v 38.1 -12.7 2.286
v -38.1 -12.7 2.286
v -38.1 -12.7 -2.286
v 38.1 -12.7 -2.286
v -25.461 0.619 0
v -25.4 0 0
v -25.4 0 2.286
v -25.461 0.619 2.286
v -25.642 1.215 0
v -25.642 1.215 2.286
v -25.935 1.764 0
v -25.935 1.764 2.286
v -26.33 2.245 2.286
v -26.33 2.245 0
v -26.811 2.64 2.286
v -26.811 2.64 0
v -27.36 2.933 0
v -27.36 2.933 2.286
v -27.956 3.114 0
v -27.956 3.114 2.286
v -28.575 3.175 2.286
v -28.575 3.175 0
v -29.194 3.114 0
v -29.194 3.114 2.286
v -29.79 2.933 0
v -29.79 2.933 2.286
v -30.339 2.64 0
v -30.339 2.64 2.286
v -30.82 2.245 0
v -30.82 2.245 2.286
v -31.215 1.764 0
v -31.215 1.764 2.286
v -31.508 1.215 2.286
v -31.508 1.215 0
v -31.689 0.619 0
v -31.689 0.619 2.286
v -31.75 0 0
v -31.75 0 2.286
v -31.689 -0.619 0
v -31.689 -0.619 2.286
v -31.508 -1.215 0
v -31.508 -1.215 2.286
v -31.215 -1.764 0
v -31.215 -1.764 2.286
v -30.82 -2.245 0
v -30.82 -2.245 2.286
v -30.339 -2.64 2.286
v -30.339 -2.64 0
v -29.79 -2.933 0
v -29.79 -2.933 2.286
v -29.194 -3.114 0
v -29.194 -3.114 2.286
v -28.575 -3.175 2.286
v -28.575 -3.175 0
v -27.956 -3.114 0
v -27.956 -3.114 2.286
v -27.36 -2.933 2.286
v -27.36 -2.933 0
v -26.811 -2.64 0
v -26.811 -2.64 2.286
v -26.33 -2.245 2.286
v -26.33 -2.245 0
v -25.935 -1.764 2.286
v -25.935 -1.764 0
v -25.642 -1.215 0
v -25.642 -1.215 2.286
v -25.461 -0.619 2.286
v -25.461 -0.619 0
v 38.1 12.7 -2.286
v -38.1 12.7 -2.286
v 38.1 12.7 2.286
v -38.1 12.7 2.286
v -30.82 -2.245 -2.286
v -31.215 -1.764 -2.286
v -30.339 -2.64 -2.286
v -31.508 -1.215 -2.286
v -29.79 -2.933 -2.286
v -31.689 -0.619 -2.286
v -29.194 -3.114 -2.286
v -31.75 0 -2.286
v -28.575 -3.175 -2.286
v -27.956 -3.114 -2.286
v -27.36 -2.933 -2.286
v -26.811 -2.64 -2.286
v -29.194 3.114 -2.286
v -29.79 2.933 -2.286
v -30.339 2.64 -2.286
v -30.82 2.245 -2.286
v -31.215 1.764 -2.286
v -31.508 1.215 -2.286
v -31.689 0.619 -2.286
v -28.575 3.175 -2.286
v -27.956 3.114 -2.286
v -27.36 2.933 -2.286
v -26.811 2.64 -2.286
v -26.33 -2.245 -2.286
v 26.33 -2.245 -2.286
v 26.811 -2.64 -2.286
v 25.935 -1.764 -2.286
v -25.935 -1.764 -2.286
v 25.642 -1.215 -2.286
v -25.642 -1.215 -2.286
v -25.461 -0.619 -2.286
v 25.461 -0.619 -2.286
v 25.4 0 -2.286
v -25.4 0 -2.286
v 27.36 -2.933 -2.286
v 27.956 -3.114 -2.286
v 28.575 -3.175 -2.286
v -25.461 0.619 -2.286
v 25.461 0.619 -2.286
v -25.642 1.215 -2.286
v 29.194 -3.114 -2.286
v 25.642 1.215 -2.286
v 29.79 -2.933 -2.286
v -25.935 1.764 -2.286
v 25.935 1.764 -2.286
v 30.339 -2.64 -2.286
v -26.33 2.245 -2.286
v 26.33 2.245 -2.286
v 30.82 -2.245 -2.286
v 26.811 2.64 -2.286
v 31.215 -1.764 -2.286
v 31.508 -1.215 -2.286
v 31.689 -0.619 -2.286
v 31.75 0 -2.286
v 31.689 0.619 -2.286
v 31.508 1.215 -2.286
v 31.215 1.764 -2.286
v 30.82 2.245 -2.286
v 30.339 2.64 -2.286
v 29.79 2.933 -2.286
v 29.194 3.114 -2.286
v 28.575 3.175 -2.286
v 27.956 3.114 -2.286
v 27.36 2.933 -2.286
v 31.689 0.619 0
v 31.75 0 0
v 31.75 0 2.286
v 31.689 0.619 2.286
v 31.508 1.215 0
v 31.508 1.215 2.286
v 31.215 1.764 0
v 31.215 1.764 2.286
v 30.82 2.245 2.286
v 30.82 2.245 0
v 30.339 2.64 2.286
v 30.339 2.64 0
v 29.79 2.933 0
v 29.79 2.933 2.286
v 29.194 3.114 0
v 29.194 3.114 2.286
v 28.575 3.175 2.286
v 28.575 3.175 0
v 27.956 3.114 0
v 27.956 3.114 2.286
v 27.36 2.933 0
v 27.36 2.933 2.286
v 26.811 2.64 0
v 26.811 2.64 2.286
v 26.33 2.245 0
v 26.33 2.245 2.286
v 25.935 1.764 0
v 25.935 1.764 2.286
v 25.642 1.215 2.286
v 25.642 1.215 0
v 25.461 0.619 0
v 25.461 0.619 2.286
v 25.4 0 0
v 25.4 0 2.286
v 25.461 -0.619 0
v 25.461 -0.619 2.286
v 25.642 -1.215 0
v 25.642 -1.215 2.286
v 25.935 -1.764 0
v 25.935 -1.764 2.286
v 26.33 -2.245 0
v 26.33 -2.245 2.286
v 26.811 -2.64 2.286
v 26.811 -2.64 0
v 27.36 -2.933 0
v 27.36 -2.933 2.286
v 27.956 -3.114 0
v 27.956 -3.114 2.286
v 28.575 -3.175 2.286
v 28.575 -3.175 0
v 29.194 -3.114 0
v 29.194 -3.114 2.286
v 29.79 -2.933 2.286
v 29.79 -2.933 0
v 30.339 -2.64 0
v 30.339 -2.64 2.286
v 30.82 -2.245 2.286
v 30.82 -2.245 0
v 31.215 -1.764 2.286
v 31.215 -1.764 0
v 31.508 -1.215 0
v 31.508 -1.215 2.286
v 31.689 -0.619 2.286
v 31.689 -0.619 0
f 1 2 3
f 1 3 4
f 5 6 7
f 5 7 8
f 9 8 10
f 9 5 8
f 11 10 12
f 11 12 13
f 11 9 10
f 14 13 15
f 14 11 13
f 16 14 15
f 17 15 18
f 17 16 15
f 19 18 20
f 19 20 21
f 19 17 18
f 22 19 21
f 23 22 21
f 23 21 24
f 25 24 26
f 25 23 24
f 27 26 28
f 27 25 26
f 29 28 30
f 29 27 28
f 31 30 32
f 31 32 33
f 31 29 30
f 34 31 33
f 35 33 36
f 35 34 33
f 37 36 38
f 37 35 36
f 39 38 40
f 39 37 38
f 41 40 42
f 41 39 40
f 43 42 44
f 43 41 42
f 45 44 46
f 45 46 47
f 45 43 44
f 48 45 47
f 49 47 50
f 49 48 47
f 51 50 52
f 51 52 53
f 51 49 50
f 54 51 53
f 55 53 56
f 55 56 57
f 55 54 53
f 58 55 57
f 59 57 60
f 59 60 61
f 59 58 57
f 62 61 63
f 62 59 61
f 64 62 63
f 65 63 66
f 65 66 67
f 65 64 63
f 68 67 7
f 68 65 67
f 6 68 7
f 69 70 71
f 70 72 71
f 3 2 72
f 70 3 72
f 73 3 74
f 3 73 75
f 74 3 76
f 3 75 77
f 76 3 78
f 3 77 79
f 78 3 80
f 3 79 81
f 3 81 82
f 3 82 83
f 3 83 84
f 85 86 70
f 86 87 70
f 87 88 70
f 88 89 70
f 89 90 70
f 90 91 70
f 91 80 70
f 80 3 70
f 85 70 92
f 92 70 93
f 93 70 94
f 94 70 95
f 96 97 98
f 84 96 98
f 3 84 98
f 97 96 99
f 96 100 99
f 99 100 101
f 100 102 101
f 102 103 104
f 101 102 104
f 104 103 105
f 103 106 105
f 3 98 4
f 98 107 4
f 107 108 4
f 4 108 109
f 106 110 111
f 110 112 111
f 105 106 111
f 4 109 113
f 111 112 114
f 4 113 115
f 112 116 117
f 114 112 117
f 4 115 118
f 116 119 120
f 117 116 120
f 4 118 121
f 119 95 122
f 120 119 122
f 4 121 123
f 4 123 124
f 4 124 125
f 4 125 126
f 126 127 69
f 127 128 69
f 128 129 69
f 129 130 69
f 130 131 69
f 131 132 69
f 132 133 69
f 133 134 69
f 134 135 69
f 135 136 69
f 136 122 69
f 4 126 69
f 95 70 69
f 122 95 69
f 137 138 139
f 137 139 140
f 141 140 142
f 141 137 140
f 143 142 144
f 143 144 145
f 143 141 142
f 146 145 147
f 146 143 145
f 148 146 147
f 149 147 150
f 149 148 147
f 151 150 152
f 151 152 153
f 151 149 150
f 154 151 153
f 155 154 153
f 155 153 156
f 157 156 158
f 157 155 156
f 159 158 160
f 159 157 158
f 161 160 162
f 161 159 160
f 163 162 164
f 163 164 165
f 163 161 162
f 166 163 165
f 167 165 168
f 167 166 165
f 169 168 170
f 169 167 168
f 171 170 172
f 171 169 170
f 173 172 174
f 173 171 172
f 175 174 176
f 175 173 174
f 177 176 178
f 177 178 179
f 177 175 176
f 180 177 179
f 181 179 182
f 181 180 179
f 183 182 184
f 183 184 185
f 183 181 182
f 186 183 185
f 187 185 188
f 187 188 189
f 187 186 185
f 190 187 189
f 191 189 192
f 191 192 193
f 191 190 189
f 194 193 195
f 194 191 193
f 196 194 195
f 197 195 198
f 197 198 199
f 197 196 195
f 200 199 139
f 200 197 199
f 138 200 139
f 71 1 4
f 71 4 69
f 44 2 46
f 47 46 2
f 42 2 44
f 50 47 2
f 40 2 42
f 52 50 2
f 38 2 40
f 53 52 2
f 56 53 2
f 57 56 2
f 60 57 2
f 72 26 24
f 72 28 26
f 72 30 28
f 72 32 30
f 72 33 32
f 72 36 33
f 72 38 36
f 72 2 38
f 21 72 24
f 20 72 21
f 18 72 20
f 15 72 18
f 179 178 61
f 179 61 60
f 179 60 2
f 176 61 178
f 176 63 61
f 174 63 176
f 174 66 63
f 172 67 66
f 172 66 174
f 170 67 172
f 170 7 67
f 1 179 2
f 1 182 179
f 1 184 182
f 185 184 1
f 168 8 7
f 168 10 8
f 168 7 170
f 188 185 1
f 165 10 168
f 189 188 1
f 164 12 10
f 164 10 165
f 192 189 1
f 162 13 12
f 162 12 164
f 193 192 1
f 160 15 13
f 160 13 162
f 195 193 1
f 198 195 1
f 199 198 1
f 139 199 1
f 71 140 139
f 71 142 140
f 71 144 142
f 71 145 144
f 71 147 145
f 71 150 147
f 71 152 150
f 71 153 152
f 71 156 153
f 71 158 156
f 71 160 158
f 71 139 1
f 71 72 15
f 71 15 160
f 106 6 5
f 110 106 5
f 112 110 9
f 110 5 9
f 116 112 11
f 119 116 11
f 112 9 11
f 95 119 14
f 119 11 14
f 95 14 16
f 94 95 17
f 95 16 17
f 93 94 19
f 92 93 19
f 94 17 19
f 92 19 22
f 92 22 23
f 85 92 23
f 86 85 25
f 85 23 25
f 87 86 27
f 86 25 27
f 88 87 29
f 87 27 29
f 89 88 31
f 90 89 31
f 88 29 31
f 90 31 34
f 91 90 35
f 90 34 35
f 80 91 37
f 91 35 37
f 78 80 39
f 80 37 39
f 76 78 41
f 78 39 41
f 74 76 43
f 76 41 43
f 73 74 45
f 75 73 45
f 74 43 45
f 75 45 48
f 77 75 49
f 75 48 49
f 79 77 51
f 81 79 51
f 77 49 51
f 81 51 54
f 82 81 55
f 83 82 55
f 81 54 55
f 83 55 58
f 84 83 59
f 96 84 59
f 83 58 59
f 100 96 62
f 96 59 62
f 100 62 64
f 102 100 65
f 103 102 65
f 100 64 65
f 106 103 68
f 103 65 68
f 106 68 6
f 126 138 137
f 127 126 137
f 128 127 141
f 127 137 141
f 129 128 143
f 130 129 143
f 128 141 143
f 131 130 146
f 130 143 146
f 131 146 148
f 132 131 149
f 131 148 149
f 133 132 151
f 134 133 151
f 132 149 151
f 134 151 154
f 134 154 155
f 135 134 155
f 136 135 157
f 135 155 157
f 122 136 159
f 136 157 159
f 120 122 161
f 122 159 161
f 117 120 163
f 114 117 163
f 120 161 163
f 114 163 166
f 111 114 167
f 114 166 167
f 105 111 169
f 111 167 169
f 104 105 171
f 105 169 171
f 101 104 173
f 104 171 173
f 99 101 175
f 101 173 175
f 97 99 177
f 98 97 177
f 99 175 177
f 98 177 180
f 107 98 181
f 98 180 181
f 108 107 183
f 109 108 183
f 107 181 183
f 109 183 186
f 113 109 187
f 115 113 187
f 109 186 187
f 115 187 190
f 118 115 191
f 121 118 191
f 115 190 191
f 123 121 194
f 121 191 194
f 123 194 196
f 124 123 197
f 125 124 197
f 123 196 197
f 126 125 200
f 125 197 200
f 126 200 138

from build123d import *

# Parameters (mm, degrees)
SKETCH3_W                = 76.2
SKETCH3_H                = 25.4
SKETCH3_R                = 3.175
BOSS_EXTRUDE1_DEPTH      = 2.286
BOSS_EXTRUDE1_DEPTH_BACK = 2.286


with BuildPart() as part:
    # Sketch3 → Boss-Extrude1 (new body, two sides)
    with BuildSketch(Plane.XY) as boss_extrude1_sk:
        Rectangle(SKETCH3_W, SKETCH3_H)
        with Locations((-28.575, 0)):
            Circle(SKETCH3_R, mode=Mode.SUBTRACT)
        with Locations((28.575, 0)):
            Circle(SKETCH3_R, mode=Mode.SUBTRACT)
    extrude(amount=BOSS_EXTRUDE1_DEPTH)
    extrude(boss_extrude1_sk.sketch, amount=-BOSS_EXTRUDE1_DEPTH_BACK)


solid = part.part
